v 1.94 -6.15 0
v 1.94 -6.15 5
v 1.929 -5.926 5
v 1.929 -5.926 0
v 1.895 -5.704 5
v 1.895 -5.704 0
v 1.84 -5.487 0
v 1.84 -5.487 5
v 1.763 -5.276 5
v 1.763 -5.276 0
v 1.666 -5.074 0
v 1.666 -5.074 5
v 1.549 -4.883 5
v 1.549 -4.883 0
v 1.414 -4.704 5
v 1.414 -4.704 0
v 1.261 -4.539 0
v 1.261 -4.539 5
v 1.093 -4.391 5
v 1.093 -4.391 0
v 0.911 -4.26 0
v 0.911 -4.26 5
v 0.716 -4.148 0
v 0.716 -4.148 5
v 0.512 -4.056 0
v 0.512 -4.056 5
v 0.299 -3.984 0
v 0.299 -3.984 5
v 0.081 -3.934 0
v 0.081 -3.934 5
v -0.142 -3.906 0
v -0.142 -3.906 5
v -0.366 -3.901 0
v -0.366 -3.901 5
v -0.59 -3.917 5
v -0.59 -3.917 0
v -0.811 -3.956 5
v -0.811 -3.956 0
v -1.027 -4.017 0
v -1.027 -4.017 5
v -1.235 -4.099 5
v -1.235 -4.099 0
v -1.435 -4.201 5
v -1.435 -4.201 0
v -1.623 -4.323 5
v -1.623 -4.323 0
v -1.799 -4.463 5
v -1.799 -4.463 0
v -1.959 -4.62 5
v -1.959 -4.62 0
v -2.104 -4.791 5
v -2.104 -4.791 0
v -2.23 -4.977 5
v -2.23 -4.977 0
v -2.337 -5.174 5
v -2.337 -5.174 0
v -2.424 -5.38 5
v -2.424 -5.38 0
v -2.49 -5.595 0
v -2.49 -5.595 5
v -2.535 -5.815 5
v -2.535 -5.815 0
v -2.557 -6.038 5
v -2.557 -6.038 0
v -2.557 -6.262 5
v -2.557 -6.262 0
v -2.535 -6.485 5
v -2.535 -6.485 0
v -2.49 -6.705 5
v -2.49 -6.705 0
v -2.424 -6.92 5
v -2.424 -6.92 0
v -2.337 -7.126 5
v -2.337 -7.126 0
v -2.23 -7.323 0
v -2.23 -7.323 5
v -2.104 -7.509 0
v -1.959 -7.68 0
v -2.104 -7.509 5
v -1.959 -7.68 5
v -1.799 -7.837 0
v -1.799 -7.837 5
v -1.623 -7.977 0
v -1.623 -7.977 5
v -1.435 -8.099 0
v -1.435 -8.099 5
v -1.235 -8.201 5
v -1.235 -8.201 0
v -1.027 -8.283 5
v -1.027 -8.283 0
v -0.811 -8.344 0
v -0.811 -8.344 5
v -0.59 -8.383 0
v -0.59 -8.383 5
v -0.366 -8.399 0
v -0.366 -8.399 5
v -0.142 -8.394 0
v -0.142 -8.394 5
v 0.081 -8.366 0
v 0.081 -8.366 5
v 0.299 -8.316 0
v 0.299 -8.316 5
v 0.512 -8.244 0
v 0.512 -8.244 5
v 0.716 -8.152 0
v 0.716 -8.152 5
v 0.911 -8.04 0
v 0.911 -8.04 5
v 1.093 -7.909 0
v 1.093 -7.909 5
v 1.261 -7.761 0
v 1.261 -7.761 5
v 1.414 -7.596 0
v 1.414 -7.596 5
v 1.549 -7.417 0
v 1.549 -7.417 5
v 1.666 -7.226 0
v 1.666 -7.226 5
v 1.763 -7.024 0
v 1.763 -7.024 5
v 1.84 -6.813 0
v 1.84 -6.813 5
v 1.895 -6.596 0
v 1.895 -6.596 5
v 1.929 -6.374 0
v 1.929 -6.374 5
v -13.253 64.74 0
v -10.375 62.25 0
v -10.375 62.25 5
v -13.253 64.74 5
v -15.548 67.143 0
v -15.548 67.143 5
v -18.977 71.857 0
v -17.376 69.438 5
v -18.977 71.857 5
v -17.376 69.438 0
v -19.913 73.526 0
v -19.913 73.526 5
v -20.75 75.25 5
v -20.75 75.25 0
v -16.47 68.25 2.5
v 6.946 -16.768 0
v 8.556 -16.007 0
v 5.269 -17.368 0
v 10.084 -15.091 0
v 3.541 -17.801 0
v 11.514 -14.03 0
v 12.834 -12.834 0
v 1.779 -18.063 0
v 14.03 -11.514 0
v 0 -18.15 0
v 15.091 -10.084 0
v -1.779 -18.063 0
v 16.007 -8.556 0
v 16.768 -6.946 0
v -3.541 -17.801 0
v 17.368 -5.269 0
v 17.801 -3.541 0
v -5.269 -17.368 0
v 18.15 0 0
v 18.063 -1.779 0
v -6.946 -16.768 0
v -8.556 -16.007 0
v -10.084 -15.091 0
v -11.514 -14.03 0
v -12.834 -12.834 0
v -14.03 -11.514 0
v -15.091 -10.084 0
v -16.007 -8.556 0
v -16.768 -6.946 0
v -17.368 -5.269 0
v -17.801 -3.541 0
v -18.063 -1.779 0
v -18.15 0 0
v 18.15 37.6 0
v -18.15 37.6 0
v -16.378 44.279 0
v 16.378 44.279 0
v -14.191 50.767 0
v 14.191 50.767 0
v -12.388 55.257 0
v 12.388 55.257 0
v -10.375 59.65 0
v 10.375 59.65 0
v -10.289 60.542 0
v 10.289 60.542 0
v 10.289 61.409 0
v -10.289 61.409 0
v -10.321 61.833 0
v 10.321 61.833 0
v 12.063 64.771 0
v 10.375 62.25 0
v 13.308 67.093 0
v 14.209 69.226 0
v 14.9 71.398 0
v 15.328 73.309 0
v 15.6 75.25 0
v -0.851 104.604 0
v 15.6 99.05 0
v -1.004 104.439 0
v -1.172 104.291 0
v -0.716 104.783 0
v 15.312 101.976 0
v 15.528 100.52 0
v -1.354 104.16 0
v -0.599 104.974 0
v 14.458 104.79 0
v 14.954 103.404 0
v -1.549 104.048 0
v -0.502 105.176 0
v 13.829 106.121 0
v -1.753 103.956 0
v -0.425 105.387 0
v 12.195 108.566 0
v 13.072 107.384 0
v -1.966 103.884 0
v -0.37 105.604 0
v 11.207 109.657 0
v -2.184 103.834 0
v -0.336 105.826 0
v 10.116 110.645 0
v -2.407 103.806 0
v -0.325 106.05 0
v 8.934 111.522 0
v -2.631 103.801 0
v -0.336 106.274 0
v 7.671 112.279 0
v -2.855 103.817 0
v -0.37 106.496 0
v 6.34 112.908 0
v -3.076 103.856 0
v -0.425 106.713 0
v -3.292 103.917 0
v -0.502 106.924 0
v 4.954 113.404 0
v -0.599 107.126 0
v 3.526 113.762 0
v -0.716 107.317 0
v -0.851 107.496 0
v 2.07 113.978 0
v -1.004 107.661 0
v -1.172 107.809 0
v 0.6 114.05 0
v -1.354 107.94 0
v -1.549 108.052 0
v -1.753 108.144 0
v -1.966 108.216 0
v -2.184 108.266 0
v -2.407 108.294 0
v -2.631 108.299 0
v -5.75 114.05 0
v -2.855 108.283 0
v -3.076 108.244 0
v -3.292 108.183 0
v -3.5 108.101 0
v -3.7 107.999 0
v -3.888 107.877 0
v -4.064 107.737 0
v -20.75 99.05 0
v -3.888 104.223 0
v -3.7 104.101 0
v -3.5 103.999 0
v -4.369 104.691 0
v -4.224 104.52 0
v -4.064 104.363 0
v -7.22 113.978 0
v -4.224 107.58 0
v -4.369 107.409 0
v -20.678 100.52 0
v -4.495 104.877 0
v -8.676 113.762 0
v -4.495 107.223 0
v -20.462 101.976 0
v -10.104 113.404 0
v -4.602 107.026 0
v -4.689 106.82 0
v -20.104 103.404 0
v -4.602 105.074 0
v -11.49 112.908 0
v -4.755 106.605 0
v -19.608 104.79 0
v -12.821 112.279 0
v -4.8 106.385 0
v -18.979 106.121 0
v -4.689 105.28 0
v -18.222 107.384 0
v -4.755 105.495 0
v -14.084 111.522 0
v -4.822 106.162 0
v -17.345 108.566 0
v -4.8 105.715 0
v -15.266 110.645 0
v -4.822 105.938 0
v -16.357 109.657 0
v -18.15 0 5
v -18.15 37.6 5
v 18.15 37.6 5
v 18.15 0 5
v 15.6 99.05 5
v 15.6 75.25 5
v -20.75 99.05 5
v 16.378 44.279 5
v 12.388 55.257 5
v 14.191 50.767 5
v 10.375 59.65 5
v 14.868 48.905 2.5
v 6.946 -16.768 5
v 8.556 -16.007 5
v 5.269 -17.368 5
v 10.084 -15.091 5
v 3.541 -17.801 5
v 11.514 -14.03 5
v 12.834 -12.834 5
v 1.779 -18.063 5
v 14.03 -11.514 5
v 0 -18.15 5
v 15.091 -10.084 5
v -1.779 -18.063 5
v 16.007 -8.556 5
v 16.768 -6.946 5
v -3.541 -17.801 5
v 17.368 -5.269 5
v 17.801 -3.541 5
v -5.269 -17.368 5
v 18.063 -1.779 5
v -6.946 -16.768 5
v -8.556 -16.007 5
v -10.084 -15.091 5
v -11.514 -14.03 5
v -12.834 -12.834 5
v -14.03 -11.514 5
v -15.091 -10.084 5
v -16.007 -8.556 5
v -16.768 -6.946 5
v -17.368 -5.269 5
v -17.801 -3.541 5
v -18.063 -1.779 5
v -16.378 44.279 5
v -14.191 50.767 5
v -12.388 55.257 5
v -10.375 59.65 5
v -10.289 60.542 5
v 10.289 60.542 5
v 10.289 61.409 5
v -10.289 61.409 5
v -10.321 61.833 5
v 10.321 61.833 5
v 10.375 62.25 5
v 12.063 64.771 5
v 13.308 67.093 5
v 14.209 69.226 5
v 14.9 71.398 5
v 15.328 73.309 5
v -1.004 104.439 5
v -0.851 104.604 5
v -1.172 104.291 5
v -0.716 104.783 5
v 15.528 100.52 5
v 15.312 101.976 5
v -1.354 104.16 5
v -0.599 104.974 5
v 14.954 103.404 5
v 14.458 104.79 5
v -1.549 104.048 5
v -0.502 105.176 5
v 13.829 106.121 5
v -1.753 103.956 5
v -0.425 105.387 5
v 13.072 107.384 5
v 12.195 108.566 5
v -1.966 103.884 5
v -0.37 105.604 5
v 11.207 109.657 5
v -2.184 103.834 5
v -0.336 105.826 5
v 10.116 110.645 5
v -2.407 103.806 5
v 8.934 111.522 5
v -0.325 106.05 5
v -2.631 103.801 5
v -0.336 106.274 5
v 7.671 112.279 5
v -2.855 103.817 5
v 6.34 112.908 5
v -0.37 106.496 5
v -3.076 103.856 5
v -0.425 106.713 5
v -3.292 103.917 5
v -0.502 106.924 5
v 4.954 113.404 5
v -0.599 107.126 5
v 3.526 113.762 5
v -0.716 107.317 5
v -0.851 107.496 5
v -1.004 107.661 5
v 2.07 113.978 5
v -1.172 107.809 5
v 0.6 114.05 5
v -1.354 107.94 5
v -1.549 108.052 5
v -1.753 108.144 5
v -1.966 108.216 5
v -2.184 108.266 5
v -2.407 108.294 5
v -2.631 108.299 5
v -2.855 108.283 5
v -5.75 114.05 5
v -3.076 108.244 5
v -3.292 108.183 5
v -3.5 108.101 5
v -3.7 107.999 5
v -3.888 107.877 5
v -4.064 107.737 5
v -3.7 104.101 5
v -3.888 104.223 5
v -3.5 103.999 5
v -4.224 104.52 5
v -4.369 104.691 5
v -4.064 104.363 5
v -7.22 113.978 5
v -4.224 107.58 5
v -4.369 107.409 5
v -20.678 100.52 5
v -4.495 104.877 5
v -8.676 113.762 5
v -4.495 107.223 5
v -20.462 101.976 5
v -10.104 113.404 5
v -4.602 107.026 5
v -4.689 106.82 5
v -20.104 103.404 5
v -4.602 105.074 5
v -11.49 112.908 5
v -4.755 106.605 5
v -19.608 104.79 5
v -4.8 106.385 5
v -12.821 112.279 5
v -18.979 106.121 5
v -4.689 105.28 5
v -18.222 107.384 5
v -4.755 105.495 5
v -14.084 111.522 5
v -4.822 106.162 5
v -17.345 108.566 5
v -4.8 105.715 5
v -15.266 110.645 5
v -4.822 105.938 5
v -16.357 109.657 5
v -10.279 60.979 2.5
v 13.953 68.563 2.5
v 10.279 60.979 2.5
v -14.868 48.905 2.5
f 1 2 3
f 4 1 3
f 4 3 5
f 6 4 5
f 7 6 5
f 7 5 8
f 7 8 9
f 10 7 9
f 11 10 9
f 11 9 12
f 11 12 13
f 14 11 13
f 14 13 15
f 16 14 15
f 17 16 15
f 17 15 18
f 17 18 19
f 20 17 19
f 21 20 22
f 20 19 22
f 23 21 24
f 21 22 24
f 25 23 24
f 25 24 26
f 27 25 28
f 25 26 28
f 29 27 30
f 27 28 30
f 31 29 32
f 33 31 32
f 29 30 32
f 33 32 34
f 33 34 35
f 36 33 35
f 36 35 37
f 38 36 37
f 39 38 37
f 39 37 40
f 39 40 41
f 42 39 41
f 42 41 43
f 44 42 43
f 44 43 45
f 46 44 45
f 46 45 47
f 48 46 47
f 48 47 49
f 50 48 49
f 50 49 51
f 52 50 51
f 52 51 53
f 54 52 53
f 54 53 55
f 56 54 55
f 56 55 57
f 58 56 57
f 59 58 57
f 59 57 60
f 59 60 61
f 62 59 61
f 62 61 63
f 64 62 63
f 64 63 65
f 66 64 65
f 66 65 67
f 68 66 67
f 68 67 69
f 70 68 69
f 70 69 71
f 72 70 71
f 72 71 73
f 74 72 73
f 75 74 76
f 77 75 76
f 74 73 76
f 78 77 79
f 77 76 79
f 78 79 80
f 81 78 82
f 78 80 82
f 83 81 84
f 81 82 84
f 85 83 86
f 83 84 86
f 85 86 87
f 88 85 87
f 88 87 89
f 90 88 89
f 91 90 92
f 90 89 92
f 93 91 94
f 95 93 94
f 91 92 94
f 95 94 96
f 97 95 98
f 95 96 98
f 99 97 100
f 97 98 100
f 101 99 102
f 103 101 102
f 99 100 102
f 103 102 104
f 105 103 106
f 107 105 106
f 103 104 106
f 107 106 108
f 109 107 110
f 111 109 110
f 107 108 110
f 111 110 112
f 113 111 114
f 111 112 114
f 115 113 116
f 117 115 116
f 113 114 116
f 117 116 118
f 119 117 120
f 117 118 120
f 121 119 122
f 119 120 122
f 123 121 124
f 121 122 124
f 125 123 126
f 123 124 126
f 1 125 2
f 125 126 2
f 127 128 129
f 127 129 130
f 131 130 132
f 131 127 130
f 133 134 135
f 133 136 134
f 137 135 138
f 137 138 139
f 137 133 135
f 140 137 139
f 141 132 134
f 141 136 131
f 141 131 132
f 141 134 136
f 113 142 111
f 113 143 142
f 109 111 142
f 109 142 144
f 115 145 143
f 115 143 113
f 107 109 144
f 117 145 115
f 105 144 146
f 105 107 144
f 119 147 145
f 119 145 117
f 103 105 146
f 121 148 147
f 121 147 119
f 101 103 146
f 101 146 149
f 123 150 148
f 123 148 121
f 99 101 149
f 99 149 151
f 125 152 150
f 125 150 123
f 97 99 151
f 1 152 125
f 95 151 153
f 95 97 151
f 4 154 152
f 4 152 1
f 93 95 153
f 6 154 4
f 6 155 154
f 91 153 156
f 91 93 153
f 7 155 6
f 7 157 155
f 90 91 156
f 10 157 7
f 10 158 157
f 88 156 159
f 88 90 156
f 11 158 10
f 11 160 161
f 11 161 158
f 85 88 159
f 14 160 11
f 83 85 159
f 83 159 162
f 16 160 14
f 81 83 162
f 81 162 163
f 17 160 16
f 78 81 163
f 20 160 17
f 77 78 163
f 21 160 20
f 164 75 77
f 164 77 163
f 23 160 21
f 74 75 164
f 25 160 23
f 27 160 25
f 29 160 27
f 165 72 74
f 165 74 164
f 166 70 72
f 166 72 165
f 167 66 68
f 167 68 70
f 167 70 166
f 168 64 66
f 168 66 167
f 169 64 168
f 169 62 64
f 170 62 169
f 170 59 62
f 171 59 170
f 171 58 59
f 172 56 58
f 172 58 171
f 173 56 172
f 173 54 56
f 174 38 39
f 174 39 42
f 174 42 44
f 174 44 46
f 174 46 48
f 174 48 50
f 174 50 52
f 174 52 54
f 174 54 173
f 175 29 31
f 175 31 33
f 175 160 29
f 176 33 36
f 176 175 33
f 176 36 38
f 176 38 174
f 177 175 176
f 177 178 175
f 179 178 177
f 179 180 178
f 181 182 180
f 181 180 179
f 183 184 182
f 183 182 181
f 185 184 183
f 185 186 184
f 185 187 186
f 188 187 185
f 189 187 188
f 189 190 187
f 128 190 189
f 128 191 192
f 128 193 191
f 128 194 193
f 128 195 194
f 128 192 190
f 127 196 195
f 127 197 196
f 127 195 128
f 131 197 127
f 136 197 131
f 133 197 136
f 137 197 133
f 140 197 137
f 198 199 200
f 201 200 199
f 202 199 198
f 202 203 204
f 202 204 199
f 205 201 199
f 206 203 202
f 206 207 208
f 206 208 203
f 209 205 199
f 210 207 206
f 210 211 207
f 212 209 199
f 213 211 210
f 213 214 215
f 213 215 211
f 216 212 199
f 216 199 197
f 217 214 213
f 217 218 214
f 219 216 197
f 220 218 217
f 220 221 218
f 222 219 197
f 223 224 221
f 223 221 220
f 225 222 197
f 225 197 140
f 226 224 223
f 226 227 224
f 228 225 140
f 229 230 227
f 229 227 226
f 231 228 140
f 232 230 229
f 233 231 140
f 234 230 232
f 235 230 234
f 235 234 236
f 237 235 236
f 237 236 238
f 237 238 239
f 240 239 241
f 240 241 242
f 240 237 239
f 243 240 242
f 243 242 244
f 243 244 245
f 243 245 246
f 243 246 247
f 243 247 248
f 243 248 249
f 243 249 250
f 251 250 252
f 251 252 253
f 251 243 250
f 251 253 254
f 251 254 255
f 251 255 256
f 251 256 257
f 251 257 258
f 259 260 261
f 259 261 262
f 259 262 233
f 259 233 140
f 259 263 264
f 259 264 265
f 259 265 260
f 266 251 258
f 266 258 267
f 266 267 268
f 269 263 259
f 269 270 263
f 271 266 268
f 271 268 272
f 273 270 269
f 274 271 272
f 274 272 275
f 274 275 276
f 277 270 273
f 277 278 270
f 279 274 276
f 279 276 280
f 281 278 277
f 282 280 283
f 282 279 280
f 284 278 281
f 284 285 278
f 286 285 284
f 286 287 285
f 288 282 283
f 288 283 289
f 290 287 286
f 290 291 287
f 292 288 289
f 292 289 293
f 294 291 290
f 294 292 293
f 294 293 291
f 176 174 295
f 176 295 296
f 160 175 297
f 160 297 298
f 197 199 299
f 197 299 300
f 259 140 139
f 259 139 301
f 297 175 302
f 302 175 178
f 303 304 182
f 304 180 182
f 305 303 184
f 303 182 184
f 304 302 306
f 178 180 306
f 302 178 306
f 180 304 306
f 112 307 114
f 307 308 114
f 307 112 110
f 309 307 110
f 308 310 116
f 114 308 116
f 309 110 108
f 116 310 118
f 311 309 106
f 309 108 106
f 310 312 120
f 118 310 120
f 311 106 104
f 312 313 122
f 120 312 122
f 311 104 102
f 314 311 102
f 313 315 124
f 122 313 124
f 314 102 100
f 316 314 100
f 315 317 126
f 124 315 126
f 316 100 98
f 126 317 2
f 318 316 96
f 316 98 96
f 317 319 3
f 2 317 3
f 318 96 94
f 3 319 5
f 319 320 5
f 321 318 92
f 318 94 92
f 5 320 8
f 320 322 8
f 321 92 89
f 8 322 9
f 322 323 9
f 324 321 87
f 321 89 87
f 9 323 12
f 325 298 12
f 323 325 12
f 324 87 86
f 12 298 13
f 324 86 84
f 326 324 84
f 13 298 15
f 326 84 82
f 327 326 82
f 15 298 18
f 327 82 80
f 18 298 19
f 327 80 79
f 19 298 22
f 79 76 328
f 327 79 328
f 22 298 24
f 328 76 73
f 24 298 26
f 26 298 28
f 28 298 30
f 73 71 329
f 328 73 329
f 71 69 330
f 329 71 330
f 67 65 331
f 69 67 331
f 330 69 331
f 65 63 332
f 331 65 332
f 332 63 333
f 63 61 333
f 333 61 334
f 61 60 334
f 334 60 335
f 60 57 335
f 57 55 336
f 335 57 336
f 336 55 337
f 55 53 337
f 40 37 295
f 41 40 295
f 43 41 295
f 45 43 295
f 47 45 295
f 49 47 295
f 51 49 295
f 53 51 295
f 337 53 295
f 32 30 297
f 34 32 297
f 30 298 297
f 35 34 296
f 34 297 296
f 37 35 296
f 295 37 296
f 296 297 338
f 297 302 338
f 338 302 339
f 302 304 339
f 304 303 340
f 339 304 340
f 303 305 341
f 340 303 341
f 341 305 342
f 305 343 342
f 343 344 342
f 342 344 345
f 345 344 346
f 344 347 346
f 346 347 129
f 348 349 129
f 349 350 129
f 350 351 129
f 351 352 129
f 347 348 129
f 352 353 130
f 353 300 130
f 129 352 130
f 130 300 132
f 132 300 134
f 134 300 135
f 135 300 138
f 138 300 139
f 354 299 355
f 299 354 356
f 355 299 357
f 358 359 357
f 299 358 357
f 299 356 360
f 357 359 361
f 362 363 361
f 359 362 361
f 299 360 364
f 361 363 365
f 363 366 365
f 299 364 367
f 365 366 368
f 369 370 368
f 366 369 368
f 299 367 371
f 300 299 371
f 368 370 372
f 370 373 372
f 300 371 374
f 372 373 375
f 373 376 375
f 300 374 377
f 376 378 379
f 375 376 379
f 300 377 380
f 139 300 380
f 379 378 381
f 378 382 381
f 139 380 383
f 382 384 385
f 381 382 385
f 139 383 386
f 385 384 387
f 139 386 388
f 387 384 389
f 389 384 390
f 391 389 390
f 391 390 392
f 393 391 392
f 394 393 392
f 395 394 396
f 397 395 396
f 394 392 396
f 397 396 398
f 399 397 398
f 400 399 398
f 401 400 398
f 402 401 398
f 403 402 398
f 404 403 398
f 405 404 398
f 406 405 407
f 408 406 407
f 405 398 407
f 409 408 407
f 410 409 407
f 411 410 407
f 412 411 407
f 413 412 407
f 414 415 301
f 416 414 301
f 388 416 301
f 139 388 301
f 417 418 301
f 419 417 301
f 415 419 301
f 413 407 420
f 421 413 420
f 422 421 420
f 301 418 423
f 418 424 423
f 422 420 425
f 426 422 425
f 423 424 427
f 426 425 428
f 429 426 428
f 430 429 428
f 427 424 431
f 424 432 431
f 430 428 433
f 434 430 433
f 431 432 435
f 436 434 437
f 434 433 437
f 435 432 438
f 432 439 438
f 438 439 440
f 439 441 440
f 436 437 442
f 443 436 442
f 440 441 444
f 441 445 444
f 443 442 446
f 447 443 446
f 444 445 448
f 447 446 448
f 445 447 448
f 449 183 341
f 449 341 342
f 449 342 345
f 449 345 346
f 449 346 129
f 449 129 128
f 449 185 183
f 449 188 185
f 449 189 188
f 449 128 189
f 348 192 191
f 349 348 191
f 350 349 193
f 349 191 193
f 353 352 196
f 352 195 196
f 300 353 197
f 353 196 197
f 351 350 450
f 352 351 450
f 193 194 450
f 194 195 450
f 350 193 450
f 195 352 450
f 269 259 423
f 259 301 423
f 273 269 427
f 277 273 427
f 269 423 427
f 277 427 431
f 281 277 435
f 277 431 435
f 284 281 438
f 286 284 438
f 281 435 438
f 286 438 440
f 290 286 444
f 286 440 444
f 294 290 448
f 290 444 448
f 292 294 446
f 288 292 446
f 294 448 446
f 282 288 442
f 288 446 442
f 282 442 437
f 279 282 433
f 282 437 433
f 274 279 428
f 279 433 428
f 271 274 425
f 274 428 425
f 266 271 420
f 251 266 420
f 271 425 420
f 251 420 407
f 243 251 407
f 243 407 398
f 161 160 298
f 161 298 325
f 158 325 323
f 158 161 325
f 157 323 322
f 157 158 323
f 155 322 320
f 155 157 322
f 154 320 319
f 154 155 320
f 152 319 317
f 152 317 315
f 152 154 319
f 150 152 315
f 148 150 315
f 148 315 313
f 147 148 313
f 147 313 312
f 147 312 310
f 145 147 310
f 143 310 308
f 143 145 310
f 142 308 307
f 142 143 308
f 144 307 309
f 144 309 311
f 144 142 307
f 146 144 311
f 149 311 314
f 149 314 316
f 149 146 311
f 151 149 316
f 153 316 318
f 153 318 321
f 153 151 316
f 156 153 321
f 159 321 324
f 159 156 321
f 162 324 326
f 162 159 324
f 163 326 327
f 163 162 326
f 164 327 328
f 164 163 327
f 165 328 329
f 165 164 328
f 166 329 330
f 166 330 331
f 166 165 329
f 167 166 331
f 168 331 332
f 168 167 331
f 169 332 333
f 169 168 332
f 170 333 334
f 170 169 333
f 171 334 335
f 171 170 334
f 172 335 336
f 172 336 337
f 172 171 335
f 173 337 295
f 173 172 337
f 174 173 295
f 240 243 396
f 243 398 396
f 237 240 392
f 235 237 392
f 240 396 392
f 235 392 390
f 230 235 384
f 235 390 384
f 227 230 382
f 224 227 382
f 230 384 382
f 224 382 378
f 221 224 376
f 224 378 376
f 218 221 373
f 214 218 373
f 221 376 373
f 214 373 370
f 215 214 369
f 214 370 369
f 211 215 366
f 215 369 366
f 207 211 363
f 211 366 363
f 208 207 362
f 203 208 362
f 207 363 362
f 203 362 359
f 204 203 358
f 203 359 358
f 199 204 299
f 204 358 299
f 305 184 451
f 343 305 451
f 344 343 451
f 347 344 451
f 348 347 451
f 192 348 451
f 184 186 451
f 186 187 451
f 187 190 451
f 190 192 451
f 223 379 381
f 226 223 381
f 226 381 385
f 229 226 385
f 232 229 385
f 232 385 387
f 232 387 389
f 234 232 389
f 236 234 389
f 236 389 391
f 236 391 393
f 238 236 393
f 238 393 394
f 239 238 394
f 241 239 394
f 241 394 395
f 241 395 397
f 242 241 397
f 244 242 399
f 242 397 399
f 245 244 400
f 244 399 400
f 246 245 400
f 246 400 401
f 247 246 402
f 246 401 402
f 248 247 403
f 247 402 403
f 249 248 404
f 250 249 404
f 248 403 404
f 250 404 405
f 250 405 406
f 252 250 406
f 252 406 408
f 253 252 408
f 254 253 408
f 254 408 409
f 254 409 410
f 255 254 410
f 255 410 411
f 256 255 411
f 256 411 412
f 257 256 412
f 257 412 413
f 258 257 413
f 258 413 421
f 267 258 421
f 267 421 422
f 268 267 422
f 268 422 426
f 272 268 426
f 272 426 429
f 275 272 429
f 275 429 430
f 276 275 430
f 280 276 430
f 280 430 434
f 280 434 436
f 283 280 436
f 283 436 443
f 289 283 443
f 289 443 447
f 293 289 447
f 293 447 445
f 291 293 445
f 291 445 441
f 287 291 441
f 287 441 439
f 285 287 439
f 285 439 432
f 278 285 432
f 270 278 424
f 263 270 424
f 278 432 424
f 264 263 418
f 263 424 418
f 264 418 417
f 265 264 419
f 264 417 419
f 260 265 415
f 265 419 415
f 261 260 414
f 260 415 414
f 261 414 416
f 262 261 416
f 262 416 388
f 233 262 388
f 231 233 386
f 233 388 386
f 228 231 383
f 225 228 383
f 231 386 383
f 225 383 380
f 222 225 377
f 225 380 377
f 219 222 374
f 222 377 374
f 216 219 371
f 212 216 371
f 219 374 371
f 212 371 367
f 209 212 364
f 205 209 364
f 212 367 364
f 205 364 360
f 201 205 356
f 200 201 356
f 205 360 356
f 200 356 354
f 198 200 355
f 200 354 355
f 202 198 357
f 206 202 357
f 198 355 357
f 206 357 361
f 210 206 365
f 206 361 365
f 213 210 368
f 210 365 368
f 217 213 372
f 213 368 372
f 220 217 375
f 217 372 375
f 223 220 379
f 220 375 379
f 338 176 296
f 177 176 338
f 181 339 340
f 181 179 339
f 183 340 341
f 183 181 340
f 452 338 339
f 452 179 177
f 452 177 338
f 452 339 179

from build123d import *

# Parameters (mm, degrees)
RESSALTO_EXTRUS_O1_DEPTH = 5
ESBO_O2_R                = 2.25
CORTE_EXTRUS_O1_DEPTH    = 117.030017788
FILETE1_R                = 15


with BuildPart() as part:
    # Esboço1 → Ressalto-extrusão1 (new body)
    with BuildSketch(Plane.XY):
        with BuildLine():
            Line((-18.15, 0), (-18.15, 37.6))
            add(Edge.make_bspline(
                [(-18.15, 37.6), (-15.473970767, 49.184313893), (-10.375, 59.65)],
                knots=[0, 0, 0, 0.611079356, 0.611079356, 0.611079356], degree=2))
            add(Edge.make_bspline(
                [(-10.375, 59.65), (-10.182305069, 61.008012224), (-10.375, 62.25)],
                knots=[0, 0, 0, 0.268489531, 0.268489531, 0.268489531], degree=2))
            add(Edge.make_bspline(
                [(-10.375, 62.25), (-17.376864496, 67.749205026), (-20.75, 75.25)],
                knots=[0, 0, 0, 0.738516148, 0.738516148, 0.738516148], degree=2))
            Line((-20.75, 75.25), (-20.75, 114.05))
            Line((-20.75, 114.05), (15.6, 114.05))
            Line((15.6, 114.05), (15.6, 75.25))
            add(Edge.make_bspline(
                [(10.375, 62.25), (14.919065783, 68.376354775), (15.6, 75.25)],
                knots=[0, 0, 0, 0.739355324, 0.739355324, 0.739355324], degree=2))
            add(Edge.make_bspline(
                [(10.375, 59.65), (10.182305069, 61.008012224), (10.375, 62.25)],
                knots=[0, 0, 0, 0.268489531, 0.268489531, 0.268489531], degree=2))
            add(Edge.make_bspline(
                [(18.15, 37.6), (15.473970767, 49.184313893), (10.375, 59.65)],
                knots=[0, 0, 0, 0.611079356, 0.611079356, 0.611079356], degree=2))
            Line((18.15, 37.6), (18.15, 0))
            ThreePointArc((18.15, 0), (0, -18.15), (-18.15, 0))
        make_face()
    extrude(amount=RESSALTO_EXTRUS_O1_DEPTH)

    # Esboço2 → Corte-extrusão1 (cut, through all)
    with BuildSketch(Plane.XY.offset(5)):
        with Locations((-0.31, -6.15)):
            Circle(ESBO_O2_R)
        with Locations((-2.575, 106.05)):
            Circle(ESBO_O2_R)
    extrude(amount=-CORTE_EXTRUS_O1_DEPTH, mode=Mode.SUBTRACT)

    # Filete1
    filete1_edges = [part.edges().sort_by_distance(p)[0] for p in [
        (-20.75, 114.05, 2.5),
        (15.6, 114.05, 2.5),
    ]]
    fillet(filete1_edges, radius=FILETE1_R)


solid = part.part
